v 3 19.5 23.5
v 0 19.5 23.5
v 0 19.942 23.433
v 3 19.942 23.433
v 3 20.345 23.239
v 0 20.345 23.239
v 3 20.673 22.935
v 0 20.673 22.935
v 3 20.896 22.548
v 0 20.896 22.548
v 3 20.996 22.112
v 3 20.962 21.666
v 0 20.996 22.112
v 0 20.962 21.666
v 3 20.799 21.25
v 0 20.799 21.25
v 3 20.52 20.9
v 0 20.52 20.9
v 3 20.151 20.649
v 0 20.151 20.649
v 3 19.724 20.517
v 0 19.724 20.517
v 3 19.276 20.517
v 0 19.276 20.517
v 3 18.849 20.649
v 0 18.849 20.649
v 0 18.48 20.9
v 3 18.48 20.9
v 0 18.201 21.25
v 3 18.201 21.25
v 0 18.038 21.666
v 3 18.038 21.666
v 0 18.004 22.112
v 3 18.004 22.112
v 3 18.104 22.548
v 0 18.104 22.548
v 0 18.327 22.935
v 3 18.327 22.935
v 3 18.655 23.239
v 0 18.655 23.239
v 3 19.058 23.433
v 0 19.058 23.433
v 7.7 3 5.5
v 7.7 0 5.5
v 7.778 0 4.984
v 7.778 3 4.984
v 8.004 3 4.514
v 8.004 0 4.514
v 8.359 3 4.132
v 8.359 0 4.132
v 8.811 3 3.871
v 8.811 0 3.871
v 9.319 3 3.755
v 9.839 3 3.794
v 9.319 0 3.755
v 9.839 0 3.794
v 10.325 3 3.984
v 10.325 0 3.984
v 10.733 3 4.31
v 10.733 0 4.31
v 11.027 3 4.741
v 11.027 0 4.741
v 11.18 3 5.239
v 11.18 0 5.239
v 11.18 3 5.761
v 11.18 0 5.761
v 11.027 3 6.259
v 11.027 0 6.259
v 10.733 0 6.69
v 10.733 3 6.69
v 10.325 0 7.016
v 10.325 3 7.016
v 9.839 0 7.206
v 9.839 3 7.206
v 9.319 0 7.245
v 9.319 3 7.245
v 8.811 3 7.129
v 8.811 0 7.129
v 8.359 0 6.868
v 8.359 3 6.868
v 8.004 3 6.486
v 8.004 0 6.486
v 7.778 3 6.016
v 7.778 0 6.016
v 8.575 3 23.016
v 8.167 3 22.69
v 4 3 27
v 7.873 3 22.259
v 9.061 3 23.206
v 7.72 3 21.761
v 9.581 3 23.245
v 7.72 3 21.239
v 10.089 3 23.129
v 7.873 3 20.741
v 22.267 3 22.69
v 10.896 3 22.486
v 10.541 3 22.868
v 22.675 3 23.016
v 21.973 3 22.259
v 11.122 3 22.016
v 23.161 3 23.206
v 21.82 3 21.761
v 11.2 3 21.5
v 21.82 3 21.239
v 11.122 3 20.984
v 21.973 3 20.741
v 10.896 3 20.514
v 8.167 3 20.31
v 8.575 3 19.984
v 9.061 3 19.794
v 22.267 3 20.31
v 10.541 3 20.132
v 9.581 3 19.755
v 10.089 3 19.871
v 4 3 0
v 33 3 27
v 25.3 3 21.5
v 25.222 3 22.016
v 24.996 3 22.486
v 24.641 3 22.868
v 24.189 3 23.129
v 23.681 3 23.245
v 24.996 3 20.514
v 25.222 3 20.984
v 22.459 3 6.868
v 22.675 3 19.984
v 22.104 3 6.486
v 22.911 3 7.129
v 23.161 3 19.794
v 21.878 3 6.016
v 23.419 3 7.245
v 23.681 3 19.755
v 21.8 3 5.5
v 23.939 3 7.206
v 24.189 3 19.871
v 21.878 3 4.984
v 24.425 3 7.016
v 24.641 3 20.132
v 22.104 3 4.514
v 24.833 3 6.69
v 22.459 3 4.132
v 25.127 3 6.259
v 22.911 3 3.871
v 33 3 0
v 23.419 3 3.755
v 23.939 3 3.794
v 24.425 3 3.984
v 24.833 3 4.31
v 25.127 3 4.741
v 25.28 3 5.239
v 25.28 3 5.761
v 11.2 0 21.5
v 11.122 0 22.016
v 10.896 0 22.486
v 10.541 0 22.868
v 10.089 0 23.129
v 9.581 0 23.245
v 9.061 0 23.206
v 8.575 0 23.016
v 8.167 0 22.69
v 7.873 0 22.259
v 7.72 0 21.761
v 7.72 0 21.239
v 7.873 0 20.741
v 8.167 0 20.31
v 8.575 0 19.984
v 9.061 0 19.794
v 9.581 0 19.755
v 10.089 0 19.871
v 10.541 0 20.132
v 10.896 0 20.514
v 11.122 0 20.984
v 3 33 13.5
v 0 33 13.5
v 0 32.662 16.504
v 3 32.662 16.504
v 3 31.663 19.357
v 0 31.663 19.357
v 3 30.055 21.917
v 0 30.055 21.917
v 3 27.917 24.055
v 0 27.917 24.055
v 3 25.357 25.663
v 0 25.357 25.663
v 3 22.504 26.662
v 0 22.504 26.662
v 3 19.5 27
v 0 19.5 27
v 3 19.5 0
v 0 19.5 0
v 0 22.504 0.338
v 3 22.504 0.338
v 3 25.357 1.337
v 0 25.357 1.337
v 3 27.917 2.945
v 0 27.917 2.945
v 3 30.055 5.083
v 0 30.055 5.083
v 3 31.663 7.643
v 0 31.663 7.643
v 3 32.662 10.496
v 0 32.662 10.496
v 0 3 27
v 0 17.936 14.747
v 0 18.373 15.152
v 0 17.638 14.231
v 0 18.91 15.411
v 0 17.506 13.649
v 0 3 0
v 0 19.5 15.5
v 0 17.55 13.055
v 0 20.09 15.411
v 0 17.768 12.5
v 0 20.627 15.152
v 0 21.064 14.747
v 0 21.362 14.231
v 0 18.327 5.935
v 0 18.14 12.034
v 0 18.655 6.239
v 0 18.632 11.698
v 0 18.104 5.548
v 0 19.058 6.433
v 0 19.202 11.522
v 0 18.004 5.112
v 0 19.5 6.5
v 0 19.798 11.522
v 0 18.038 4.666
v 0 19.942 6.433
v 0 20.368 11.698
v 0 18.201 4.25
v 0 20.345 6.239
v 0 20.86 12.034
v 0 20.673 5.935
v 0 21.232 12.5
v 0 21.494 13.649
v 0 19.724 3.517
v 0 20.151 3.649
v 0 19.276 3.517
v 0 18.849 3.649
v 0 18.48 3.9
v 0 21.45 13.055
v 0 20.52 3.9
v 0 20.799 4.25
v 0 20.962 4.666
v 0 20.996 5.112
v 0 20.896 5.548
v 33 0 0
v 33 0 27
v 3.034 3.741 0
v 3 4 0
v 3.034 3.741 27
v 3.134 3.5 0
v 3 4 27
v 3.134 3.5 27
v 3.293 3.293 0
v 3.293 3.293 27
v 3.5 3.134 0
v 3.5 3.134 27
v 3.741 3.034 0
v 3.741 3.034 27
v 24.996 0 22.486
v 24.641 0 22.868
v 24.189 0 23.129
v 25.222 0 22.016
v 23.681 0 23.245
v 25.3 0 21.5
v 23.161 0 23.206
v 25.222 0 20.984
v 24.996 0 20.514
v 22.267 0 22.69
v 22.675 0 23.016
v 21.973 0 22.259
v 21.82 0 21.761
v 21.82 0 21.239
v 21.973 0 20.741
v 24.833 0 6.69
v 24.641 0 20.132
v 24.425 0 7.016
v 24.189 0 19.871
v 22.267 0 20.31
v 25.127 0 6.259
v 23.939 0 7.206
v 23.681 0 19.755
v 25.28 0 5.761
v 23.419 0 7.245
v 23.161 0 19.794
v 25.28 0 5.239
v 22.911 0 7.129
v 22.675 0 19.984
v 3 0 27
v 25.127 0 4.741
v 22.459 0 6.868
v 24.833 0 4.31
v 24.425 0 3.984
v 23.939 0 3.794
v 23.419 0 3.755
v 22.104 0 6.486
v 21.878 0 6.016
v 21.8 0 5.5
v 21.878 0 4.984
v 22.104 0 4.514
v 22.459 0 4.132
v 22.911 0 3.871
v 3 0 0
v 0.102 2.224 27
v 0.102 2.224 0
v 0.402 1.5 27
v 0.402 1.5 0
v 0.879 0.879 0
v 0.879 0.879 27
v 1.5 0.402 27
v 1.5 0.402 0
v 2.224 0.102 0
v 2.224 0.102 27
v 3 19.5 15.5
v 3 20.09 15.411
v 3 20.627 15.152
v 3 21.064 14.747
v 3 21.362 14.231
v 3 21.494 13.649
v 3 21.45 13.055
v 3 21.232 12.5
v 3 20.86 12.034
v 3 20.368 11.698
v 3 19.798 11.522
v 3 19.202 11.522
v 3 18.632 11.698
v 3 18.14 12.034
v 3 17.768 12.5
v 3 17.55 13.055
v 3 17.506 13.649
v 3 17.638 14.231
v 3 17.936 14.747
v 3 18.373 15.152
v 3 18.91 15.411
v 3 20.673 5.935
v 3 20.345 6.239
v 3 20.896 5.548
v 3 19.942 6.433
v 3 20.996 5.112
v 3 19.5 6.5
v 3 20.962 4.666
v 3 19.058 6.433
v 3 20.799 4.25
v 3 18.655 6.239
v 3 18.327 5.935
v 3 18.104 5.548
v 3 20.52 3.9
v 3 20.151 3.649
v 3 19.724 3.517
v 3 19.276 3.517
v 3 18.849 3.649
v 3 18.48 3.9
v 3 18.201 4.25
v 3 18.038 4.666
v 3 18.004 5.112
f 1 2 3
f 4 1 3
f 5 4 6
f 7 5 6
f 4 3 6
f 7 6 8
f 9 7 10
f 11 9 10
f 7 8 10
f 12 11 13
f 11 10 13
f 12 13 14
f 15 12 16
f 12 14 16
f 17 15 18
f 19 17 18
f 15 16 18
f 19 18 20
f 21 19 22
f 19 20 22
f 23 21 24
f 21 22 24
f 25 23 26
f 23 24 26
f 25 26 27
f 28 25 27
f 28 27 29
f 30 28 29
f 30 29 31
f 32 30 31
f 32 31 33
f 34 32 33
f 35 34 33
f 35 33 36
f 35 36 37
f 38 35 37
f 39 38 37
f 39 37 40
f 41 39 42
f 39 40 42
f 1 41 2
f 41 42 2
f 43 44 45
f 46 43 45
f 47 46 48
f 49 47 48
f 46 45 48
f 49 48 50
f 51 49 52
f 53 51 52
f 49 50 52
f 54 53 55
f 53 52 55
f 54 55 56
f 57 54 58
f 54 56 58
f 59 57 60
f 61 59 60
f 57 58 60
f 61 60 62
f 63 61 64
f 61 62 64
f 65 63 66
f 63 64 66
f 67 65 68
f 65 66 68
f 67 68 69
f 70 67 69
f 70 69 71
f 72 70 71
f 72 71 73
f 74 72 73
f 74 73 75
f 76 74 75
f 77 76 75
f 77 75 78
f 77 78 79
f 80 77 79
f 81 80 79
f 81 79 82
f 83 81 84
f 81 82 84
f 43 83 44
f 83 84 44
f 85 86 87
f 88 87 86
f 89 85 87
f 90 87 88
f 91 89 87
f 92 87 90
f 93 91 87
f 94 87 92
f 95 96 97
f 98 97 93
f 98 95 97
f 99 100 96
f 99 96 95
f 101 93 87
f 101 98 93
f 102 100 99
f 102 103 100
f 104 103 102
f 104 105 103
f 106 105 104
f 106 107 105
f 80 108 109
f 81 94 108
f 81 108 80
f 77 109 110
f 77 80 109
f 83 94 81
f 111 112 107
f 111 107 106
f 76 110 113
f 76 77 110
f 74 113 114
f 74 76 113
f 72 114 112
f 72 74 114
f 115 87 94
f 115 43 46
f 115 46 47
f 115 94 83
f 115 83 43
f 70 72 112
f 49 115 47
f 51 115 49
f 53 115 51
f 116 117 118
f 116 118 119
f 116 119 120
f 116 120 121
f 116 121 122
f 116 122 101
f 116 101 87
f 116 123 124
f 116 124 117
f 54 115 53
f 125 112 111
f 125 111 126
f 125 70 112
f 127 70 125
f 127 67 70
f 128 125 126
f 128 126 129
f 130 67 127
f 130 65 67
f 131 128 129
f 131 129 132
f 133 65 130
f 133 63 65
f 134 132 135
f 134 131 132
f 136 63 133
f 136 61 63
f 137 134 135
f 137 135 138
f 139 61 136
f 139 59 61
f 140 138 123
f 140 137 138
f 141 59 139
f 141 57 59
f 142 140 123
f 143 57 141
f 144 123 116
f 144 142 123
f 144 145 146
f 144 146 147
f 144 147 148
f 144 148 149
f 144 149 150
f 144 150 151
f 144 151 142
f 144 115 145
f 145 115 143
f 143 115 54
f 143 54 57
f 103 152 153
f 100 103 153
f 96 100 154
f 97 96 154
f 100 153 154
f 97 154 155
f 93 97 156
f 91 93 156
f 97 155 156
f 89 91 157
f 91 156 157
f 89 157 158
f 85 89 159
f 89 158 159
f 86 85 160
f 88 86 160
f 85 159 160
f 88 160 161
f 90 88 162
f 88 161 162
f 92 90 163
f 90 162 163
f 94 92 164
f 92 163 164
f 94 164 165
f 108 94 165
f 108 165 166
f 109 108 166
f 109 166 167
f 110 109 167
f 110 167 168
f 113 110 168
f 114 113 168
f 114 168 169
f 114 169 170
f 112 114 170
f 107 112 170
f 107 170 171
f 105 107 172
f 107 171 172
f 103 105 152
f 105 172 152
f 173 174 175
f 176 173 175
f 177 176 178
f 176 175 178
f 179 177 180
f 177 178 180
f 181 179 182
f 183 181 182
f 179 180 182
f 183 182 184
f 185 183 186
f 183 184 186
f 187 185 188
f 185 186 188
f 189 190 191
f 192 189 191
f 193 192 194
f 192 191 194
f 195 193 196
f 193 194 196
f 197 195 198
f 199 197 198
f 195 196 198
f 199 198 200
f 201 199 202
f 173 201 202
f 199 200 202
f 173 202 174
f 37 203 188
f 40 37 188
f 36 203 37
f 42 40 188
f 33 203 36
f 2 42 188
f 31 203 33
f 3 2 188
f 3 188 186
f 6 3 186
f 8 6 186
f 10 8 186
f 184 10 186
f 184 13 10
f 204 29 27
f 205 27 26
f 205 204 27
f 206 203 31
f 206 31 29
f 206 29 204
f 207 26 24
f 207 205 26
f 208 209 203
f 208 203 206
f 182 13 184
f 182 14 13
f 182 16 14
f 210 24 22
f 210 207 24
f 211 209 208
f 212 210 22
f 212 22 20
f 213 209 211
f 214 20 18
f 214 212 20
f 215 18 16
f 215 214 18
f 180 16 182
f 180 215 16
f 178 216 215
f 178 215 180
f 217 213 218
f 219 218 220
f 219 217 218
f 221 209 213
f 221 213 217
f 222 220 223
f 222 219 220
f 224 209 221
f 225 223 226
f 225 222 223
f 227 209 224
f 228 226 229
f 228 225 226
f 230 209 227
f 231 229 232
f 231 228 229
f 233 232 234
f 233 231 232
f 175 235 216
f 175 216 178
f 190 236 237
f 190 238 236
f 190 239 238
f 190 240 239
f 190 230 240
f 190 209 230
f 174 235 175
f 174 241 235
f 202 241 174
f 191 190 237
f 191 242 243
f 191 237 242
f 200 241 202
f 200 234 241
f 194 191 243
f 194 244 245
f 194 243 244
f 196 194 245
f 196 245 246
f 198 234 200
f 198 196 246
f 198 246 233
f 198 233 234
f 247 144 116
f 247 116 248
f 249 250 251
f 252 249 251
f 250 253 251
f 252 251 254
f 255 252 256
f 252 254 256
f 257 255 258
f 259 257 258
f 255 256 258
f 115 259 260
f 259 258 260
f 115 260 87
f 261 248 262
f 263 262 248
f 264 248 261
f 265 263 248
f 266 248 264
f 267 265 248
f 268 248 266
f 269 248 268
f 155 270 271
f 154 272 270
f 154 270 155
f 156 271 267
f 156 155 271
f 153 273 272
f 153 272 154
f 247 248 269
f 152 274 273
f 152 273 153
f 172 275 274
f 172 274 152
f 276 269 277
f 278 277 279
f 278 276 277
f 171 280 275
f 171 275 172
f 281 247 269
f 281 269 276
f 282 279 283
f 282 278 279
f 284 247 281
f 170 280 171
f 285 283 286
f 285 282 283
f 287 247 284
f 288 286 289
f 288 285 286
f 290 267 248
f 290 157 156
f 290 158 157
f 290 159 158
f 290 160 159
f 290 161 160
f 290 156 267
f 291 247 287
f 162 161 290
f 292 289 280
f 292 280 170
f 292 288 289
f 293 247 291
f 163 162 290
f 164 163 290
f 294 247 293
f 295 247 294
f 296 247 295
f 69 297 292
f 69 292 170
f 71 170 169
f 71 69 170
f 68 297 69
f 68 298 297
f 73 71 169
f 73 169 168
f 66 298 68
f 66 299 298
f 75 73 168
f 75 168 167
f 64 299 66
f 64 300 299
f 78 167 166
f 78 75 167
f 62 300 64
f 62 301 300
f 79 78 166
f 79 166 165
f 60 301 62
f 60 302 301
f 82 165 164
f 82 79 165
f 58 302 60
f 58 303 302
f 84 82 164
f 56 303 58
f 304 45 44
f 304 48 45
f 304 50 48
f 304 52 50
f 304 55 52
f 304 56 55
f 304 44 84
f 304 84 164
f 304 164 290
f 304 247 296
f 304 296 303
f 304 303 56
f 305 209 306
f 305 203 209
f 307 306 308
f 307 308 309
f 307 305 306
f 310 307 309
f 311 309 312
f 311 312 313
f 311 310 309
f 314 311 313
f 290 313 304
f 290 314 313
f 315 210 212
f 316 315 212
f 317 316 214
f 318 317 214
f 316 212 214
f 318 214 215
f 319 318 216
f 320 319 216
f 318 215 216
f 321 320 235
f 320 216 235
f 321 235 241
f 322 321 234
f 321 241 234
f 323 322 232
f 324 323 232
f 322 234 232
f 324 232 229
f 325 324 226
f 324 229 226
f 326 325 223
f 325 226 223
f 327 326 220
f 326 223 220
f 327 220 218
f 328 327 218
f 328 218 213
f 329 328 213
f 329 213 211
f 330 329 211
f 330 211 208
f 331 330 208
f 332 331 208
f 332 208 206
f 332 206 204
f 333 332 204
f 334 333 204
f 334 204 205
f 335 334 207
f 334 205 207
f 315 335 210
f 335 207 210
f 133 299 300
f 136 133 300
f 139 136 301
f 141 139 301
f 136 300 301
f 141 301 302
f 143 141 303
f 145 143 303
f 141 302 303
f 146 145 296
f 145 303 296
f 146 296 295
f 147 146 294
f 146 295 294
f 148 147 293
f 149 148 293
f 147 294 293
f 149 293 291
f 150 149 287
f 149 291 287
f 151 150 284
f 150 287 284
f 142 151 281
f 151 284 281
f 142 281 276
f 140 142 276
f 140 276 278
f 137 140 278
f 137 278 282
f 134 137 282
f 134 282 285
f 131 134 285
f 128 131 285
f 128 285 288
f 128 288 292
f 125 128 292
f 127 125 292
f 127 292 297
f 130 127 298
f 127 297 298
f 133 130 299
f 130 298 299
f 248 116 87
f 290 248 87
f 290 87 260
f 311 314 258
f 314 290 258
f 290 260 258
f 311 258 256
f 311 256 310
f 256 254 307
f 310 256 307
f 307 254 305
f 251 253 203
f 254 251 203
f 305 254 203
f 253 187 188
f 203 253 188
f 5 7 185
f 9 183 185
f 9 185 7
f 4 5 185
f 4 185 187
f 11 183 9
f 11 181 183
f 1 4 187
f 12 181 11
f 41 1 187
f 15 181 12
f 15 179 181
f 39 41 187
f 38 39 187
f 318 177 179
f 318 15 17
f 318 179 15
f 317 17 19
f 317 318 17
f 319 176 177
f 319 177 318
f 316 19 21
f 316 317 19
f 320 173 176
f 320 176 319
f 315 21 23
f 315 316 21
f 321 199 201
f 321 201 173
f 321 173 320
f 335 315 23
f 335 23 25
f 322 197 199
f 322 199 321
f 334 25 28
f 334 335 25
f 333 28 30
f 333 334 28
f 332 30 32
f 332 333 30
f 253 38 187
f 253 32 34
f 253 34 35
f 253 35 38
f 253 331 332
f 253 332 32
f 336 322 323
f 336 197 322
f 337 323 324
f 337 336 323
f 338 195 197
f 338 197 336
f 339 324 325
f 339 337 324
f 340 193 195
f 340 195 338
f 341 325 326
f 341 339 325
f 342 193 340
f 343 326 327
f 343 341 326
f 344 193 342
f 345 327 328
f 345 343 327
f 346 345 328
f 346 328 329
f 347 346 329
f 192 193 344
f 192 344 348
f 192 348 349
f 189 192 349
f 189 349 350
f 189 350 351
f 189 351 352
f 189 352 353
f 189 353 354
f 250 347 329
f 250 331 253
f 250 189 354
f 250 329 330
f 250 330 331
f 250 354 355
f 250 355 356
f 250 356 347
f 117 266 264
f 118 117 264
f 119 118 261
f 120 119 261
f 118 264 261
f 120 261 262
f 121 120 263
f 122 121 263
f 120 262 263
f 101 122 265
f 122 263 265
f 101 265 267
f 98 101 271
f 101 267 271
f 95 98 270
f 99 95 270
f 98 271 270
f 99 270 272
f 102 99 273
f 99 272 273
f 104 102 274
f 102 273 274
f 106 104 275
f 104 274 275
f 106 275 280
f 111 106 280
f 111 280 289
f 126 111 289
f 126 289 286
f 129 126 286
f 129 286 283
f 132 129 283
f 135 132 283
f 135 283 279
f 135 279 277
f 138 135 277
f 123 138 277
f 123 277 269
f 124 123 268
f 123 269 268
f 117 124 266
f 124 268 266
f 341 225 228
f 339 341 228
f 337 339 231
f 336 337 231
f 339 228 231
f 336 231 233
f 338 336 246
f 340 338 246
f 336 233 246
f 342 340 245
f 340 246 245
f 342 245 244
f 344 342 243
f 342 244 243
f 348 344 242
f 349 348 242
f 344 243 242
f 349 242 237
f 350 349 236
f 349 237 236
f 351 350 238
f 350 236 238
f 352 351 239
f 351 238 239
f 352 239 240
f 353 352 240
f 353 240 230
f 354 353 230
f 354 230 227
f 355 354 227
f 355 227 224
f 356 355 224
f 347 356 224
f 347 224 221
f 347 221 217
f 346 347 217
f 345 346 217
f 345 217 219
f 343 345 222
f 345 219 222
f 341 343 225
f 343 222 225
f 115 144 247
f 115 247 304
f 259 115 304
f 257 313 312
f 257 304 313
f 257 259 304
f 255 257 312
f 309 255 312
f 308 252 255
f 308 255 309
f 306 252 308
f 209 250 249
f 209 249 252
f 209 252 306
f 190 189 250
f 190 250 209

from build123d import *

# Parameters (mm, degrees)
P_IDAT_VYSUNUT_M1_DEPTH  = 27
ZAOBLIT1_R               = 1
SKICA2_R                 = 1.75
ODEBRAT_VYSUNUT_M1_DEPTH = 3
ZAOBLIT2_R               = 3
ODEBRAT_VYSUNUT_M2_DEPTH = 3
SKICA3_3_R               = 1.5
ODEBRAT_VYSUNUT_M3_DEPTH = 3
SKICA3_4_R               = 2
ODEBRAT_VYSUNUT_M4_DEPTH = 3


with BuildPart() as part:
    # Skica1 → Přidat vysunutím1 (new body)
    with BuildSketch(Plane.XY):
        Polygon((0, 0), (0, 33), (3, 33), (3, 3), (33, 3), (33, 0), align=None)
    extrude(amount=P_IDAT_VYSUNUT_M1_DEPTH)

    # Zaoblit1
    zaoblit1_edges = [part.edges().sort_by_distance(p)[0] for p in [
        (3, 3, 13.5),
    ]]
    fillet(zaoblit1_edges, radius=ZAOBLIT1_R)

    # Skica2 → Odebrat vysunutím1 (cut)
    with BuildSketch(Plane.XZ):
        with Locations((9.45, 21.5)):
            Circle(SKICA2_R)
        with Locations((23.55, 21.5)):
            Circle(SKICA2_R)
        with Locations((23.55, 5.5)):
            Circle(SKICA2_R)
        with Locations((9.45, 5.5)):
            Circle(SKICA2_R)
    extrude(amount=-ODEBRAT_VYSUNUT_M1_DEPTH, mode=Mode.SUBTRACT)

    # Zaoblit2
    zaoblit2_edges = [part.edges().sort_by_distance(p)[0] for p in [
        (0, 0, 13.5),
    ]]
    fillet(zaoblit2_edges, radius=ZAOBLIT2_R)

    # Skica3 → Odebrat vysunutím2 (cut)
    with BuildSketch(Plane.ZY):
        with BuildLine():
            Line((27, 33), (13.5, 33))
            ThreePointArc((13.5, 33), (23.045941546, 29.045941546), (27, 19.5))
            Line((27, 19.5), (27, 33))
        make_face()
        with BuildLine():
            Line((0, 33), (0, 19.5))
            ThreePointArc((0, 19.5), (3.954058454, 29.045941546), (13.5, 33))
            Line((13.5, 33), (0, 33))
        make_face()
    extrude(amount=-ODEBRAT_VYSUNUT_M2_DEPTH, mode=Mode.SUBTRACT)

    # Skica3<3> → Odebrat vysunutím3 (cut)
    with BuildSketch(Plane.ZY):
        with Locations((5, 19.5)):
            Circle(SKICA3_3_R)
        with Locations((22, 19.5)):
            Circle(SKICA3_3_R)
    extrude(amount=-ODEBRAT_VYSUNUT_M3_DEPTH, mode=Mode.SUBTRACT)

    # Skica3<4> → Odebrat vysunutím4 (cut)
    with BuildSketch(Plane.ZY):
        with Locations((13.5, 19.5)):
            Circle(SKICA3_4_R)
    extrude(amount=-ODEBRAT_VYSUNUT_M4_DEPTH, mode=Mode.SUBTRACT)


solid = part.part
